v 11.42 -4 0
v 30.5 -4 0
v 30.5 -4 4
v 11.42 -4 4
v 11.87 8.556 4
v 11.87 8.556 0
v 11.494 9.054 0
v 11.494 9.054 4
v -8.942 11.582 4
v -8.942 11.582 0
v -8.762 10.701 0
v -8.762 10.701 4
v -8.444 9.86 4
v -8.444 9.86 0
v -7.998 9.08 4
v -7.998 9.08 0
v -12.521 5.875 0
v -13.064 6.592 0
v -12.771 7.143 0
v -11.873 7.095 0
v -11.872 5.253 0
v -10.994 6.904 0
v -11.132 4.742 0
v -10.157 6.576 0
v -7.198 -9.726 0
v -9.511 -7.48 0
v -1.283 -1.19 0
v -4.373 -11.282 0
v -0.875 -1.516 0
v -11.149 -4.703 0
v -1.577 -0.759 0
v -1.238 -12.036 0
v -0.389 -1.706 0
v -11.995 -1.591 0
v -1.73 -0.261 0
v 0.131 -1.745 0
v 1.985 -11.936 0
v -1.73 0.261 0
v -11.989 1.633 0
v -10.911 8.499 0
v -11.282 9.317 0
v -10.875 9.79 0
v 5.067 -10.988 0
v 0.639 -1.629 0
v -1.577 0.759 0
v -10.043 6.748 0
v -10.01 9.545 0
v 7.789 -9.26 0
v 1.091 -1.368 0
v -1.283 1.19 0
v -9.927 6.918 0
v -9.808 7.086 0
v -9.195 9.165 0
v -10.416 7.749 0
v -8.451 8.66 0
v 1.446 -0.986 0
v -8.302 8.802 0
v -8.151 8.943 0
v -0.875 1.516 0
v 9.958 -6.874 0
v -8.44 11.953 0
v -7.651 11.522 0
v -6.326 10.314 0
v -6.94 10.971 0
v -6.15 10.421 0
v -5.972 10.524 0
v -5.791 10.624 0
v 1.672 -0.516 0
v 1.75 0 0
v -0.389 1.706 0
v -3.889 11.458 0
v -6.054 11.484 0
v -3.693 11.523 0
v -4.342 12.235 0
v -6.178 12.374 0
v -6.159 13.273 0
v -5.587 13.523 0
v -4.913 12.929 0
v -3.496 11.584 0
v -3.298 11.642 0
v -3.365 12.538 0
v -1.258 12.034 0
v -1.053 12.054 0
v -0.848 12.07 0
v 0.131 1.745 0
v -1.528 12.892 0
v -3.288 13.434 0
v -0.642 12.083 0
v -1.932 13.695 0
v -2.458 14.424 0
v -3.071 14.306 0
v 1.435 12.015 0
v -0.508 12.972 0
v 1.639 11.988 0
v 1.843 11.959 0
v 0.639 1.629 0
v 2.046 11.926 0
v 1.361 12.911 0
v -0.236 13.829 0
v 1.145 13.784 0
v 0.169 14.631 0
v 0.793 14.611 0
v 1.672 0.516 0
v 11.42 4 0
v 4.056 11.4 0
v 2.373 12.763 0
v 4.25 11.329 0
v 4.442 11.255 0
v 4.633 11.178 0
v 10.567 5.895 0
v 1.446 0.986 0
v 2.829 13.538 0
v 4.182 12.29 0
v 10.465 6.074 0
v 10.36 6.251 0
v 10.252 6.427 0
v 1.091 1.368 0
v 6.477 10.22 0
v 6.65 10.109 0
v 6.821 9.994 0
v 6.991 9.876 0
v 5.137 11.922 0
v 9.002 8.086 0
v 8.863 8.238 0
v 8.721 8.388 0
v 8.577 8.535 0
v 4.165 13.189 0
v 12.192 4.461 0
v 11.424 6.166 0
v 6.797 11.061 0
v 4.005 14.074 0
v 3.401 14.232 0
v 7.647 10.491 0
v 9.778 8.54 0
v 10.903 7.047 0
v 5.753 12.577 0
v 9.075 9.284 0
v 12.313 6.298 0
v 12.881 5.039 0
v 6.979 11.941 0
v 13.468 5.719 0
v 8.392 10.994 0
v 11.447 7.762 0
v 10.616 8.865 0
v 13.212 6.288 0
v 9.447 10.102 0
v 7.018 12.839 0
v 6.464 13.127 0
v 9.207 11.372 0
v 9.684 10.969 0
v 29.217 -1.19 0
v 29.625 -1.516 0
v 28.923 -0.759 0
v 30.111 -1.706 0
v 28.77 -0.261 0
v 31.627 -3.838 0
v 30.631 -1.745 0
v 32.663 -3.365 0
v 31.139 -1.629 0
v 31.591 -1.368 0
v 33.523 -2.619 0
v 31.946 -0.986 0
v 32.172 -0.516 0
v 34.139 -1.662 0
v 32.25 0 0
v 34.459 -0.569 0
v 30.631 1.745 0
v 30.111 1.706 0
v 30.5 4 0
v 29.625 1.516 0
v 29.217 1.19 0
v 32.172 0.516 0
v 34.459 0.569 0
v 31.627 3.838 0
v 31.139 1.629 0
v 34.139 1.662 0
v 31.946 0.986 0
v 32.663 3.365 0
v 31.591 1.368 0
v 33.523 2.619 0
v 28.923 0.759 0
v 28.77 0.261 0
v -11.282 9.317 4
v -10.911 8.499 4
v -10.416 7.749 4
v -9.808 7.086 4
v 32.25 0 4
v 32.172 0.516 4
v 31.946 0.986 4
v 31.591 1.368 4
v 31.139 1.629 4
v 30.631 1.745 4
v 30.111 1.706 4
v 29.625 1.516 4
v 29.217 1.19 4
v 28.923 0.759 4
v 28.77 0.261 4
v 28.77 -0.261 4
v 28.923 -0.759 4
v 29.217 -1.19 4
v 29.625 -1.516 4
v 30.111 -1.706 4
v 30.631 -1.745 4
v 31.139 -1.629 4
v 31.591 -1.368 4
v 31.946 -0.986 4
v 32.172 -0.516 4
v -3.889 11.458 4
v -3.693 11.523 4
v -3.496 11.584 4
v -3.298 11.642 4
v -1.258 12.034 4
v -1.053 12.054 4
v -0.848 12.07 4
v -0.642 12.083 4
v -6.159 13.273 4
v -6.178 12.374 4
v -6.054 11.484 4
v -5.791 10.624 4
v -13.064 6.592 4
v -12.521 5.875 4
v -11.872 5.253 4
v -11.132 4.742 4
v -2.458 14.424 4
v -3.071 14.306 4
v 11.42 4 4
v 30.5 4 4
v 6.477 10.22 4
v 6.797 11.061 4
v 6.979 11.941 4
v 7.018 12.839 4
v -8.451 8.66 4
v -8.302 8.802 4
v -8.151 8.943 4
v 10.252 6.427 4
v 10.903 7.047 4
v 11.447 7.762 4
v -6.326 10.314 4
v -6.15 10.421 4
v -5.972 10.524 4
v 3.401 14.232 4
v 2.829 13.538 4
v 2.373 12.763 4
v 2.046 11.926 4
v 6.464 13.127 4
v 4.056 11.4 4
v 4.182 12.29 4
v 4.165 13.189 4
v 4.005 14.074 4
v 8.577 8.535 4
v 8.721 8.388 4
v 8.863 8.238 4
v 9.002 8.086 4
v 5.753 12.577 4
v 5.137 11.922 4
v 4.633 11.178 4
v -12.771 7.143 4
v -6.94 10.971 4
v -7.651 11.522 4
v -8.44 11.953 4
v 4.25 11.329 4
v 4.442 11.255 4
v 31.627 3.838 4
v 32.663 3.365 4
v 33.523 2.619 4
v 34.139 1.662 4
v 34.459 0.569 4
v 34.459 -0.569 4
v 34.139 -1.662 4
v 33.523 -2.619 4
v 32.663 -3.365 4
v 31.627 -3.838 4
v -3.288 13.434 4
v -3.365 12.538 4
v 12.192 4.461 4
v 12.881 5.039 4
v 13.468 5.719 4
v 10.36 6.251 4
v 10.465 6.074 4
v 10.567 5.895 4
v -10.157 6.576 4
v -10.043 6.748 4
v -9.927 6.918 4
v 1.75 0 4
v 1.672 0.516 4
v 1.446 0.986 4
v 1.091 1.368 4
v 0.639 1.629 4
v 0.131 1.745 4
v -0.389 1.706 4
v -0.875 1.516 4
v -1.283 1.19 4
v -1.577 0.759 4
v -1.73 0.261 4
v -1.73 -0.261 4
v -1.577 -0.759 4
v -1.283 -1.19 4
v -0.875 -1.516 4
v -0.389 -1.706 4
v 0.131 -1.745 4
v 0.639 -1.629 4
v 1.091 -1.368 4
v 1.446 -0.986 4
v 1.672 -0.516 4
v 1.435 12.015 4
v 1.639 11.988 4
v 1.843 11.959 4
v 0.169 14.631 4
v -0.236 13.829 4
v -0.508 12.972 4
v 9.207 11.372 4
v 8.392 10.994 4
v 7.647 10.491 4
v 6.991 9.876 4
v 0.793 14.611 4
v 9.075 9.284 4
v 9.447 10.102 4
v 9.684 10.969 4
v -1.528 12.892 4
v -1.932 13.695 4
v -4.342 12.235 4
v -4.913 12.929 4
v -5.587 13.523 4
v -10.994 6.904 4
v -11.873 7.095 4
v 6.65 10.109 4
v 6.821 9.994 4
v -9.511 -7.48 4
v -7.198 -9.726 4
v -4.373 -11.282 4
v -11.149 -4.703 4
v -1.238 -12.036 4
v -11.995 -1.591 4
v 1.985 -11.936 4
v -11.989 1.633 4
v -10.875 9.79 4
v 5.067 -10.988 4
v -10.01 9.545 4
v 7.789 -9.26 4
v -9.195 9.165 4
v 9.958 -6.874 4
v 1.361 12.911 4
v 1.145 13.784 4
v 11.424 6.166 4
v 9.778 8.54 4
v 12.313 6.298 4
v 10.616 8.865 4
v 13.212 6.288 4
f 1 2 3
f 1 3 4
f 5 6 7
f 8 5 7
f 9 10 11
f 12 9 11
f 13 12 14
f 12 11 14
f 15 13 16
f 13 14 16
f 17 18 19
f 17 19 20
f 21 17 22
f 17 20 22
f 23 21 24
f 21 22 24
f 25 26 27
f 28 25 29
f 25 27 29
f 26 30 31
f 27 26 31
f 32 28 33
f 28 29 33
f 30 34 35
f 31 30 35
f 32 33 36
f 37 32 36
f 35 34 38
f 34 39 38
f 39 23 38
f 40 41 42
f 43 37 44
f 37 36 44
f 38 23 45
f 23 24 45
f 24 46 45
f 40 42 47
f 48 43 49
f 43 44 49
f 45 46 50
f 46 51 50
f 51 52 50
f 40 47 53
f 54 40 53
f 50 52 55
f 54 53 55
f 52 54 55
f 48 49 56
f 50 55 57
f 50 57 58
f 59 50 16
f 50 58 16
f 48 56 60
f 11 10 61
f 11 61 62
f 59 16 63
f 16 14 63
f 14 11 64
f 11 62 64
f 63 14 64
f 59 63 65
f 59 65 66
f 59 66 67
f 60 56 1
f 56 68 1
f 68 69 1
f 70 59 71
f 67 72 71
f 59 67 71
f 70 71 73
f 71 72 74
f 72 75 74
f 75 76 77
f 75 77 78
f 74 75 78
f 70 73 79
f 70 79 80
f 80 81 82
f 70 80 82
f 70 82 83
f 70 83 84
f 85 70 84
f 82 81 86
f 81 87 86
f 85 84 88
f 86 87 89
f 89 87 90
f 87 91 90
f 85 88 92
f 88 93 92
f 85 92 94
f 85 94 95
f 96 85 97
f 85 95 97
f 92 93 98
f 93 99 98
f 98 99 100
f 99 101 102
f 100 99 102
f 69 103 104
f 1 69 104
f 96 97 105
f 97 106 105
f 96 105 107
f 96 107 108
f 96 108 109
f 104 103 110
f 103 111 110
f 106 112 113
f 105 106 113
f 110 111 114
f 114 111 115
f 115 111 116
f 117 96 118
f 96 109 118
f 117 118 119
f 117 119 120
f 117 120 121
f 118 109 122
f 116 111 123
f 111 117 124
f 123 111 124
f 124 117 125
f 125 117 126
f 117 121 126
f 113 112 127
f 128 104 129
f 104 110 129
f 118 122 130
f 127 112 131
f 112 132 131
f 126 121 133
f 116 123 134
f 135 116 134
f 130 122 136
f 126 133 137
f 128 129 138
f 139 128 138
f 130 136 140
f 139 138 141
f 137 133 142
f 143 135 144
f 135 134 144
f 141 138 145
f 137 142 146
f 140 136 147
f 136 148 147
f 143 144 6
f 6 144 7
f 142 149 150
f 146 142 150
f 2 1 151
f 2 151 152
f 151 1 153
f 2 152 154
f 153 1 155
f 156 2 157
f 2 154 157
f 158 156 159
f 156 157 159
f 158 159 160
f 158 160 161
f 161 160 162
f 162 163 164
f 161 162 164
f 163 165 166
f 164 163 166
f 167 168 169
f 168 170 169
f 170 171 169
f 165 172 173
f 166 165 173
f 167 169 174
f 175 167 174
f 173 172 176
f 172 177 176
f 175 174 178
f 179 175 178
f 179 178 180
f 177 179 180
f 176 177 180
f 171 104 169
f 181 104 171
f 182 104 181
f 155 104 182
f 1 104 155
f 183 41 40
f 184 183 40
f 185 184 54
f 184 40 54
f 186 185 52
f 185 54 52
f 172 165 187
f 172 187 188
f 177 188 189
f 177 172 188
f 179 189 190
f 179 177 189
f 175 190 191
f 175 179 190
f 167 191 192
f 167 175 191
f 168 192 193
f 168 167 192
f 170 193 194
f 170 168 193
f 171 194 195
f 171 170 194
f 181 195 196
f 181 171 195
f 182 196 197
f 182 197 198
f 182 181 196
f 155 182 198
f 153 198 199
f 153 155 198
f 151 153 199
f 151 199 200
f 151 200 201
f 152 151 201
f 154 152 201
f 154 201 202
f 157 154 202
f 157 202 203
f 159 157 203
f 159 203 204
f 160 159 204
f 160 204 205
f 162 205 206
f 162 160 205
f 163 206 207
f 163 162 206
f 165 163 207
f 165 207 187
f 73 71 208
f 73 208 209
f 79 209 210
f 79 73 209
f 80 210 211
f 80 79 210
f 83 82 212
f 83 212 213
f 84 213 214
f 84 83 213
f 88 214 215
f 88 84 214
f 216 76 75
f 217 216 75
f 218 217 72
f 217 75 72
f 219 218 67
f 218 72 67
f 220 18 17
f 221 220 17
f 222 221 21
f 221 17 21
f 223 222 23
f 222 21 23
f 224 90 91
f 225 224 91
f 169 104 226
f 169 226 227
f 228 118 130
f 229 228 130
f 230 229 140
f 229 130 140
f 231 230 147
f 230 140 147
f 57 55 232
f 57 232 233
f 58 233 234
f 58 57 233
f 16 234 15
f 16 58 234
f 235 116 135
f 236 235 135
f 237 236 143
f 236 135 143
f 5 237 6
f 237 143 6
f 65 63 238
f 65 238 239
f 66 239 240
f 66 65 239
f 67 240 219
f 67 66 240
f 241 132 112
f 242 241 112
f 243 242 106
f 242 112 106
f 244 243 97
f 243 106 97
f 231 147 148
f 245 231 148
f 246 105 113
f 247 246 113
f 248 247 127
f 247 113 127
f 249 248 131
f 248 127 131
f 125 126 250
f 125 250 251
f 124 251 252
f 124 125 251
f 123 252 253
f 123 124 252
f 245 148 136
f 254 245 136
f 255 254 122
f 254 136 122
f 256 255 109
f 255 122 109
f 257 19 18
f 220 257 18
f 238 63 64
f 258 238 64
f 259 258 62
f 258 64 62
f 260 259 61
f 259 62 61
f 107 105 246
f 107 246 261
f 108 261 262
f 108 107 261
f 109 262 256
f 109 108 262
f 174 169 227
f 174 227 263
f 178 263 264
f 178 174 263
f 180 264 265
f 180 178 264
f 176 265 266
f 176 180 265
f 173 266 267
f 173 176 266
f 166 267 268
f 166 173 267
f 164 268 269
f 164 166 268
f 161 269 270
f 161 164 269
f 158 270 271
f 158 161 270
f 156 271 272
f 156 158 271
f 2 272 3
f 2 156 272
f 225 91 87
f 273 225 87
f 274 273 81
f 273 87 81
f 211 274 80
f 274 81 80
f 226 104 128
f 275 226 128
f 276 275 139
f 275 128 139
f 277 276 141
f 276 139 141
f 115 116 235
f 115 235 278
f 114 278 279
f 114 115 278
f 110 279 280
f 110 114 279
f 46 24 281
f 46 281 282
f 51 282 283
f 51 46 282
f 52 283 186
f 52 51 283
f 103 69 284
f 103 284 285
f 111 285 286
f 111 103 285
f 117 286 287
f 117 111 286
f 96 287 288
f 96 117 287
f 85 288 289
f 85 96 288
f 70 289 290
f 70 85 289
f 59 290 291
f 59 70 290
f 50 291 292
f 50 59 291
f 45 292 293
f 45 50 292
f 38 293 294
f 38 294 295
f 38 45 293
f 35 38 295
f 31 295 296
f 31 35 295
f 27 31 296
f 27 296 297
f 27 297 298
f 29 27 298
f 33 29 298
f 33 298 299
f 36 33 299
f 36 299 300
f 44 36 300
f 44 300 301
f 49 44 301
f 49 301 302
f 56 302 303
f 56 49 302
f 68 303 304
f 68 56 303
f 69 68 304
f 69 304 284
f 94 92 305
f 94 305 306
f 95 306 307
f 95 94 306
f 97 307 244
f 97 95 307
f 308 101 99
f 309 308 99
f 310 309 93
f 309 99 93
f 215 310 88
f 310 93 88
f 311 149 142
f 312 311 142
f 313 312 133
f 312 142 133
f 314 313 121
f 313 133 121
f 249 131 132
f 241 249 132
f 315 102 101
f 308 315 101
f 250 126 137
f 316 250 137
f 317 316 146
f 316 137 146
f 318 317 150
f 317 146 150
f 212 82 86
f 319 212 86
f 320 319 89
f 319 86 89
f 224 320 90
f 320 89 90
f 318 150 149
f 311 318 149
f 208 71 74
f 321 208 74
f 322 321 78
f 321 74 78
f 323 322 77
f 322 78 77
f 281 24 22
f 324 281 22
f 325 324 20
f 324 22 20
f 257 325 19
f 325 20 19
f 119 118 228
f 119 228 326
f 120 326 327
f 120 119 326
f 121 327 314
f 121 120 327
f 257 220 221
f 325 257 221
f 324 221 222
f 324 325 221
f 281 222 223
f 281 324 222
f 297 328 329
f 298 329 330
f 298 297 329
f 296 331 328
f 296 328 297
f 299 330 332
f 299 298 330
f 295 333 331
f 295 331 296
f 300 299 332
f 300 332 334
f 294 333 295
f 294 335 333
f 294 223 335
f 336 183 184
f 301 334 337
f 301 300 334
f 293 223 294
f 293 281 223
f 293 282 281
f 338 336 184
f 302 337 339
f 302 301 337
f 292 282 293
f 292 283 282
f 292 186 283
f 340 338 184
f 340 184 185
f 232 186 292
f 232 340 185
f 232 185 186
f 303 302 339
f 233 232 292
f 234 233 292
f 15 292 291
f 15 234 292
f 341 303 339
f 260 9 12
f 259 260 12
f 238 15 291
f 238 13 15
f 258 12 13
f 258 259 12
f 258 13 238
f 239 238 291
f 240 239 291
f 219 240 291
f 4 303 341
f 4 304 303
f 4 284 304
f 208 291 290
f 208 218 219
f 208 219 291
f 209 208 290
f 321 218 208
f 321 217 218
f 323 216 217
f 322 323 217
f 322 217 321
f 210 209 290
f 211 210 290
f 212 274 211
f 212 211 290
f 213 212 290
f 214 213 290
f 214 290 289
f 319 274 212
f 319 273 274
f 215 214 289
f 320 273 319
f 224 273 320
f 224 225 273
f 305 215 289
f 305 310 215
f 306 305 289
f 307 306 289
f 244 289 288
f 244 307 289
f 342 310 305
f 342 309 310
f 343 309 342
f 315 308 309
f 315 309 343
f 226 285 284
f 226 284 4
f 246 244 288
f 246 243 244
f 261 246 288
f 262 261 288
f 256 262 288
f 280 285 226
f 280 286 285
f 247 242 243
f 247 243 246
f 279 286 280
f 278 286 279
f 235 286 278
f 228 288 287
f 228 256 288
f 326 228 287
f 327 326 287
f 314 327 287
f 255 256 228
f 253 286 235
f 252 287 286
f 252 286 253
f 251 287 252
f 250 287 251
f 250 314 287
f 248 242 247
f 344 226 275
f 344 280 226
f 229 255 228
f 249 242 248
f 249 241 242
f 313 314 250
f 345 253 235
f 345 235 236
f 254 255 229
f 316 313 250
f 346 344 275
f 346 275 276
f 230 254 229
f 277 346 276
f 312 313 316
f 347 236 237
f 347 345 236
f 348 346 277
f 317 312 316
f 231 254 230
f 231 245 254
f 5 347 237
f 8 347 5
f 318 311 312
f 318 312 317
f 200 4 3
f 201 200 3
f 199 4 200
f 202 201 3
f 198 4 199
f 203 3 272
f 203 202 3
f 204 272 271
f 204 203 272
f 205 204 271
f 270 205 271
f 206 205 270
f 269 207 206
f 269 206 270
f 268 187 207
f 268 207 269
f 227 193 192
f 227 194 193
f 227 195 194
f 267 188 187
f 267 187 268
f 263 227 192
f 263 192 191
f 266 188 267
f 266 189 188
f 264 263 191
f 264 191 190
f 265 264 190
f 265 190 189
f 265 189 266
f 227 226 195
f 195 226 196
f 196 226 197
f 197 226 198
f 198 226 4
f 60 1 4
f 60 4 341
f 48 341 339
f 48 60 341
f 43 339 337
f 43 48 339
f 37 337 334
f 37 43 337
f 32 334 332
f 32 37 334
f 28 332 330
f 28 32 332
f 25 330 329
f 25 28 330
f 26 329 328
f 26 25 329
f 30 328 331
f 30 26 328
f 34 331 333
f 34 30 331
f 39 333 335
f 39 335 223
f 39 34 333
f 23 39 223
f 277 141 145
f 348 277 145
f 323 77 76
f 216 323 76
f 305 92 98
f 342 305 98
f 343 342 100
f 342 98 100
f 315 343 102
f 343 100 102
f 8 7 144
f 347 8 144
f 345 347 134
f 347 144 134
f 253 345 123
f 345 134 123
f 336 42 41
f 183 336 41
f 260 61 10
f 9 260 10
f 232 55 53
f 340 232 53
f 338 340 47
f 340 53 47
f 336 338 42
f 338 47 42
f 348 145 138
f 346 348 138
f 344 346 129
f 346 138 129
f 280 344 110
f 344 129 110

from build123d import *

# Parameters (mm, degrees)
SKETCH1_R           = 1.75
BOSS_EXTRUDE2_DEPTH = 4


with BuildPart() as part:
    # Sketch1 → Boss-Extrude2 (new body)
    # profile 1 of 12: a face of its own
    with BuildSketch(Plane.XY):
        with BuildLine():
            Line((30.5, -4), (11.419719786, -4))
            ThreePointArc((11.419719786, -4), (-12.1, 0), (11.419719786, 4))
            Line((11.419719786, 4), (30.5, 4))
            ThreePointArc((30.5, 4), (34.5, 0), (30.5, -4))
        make_face()
        Circle(SKETCH1_R, mode=Mode.SUBTRACT)
        with Locations((30.5, 0)):
            Circle(SKETCH1_R, mode=Mode.SUBTRACT)
    # profile 2 of 12: a face of its own
    with BuildSketch(Plane.XY):
        with BuildLine():
            ThreePointArc((2.04630572, 11.925713098), (3.062574606, 11.706008576), (4.056229837, 11.399868399))
            ThreePointArc((4.056229837, 11.399868399), (4.191789848, 12.739862338), (4.004557713, 14.073618088))
            Line((4.004557713, 14.073618088), (3.400741544, 14.231598069))
            ThreePointArc((3.400741544, 14.231598069), (2.585583316, 13.159679272), (2.04630572, 11.925713098))
        make_face()
    # profile 3 of 12: a face of its own
    with BuildSketch(Plane.XY):
        with BuildLine():
            ThreePointArc((-0.641917286, 12.082960821), (0.397776079, 12.093459976), (1.434532317, 12.014662585))
            ThreePointArc((1.434532317, 12.014662585), (1.27037575, 13.351454601), (0.792800193, 14.610772615))
            Line((0.792800193, 14.610772615), (0.168997044, 14.631297504))
            ThreePointArc((0.168997044, 14.631297504), (-0.388904138, 13.405638858), (-0.641917286, 12.082960821))
        make_face()
    # profile 4 of 12: a face of its own
    with BuildSketch(Plane.XY):
        with BuildLine():
            ThreePointArc((-3.071117398, 14.306350498), (-3.344130279, 12.987655382), (-3.298347959, 11.641773952))
            ThreePointArc((-3.298347959, 11.641773952), (-2.286723162, 11.881956791), (-1.258213497, 12.034404796))
            ThreePointArc((-1.258213497, 12.034404796), (-1.713956435, 13.301787393), (-2.458222459, 14.424297241))
            Line((-2.458222459, 14.424297241), (-3.071117398, 14.306350498))
        make_face()
    # profile 5 of 12: a face of its own
    with BuildSketch(Plane.XY):
        with BuildLine():
            ThreePointArc((-6.159128153, 13.272850751), (-6.133731183, 11.926430371), (-5.791420864, 10.624003218))
            ThreePointArc((-5.791420864, 10.624003218), (-4.857967527, 11.08197417), (-3.888643585, 11.458117257))
            ThreePointArc((-3.888643585, 11.458117257), (-4.613401246, 12.593320589), (-5.587496363, 13.523427559))
            Line((-5.587496363, 13.523427559), (-6.159128153, 13.272850751))
        make_face()
    # profile 6 of 12: a face of its own
    with BuildSketch(Plane.XY):
        with BuildLine():
            ThreePointArc((-8.942094855, 11.581984556), (-8.619545875, 10.274523276), (-7.997661209, 9.080055902))
            ThreePointArc((-7.997661209, 9.080055902), (-7.188610613, 9.733132972), (-6.326480245, 10.314341845))
            ThreePointArc((-6.326480245, 10.314341845), (-7.28435745, 11.261142529), (-8.440037507, 11.952781076))
            Line((-8.440037507, 11.952781076), (-8.942094855, 11.581984556))
        make_face()
    # profile 7 of 12: a face of its own
    with BuildSketch(Plane.XY):
        with BuildLine():
            ThreePointArc((-11.2821851, 9.317495695), (-10.67845904, 8.113748343), (-9.807800202, 7.086399311))
            ThreePointArc((-9.807800202, 7.086399311), (-9.163222316, 7.902237454), (-8.450984381, 8.659726496))
            ThreePointArc((-8.450984381, 8.659726496), (-9.594540202, 9.371232193), (-10.874567661, 9.790147432))
            Line((-10.874567661, 9.790147432), (-11.2821851, 9.317495695))
        make_face()
    # profile 8 of 12: a face of its own
    with BuildSketch(Plane.XY):
        with BuildLine():
            ThreePointArc((-13.06350089, 6.591537844), (-12.208498581, 5.551122593), (-11.13218682, 4.741773571))
            ThreePointArc((-11.13218682, 4.741773571), (-10.684005749, 5.67996665), (-10.15693536, 6.576219589))
            ThreePointArc((-10.15693536, 6.576219589), (-11.42953274, 7.017191451), (-12.770511491, 7.142635705))
            Line((-12.770511491, 7.142635705), (-13.06350089, 6.591537844))
        make_face()
    # profile 9 of 12: a face of its own
    with BuildSketch(Plane.XY):
        with BuildLine():
            ThreePointArc((4.633181039, 11.177818815), (5.575692546, 10.738791954), (6.47703386, 10.22047124))
            ThreePointArc((6.47703386, 10.22047124), (6.905596548, 11.497301024), (7.017980909, 12.839437391))
            Line((7.017980909, 12.839437391), (6.464057014, 13.127048167))
            ThreePointArc((6.464057014, 13.127048167), (5.432014202, 12.2619583), (4.633181039, 11.177818815))
        make_face()
    # profile 10 of 12: a face of its own
    with BuildSketch(Plane.XY):
        with BuildLine():
            ThreePointArc((6.990588114, 9.876319042), (7.812662335, 9.239713591), (8.577048867, 8.534883288))
            ThreePointArc((8.577048867, 8.534883288), (9.277388744, 9.685311177), (9.683823524, 10.969355975))
            Line((9.683823524, 10.969355975), (9.207226173, 11.372353004))
            ThreePointArc((9.207226173, 11.372353004), (8.009412915, 10.7569375), (6.990588114, 9.876319042))
        make_face()
    # profile 11 of 12: a face of its own
    with BuildSketch(Plane.XY):
        with BuildLine():
            ThreePointArc((9.001771295, 8.085673352), (9.662693238, 7.283018563), (10.252267103, 6.426586905))
            ThreePointArc((10.252267103, 6.426586905), (11.189698333, 7.393635488), (11.870053976, 8.555993639))
            Line((11.870053976, 8.555993639), (11.494387677, 9.054417628))
            ThreePointArc((11.494387677, 9.054417628), (10.190128247, 8.719156263), (9.001771295, 8.085673352))
        make_face()
    # profile 12 of 12: a face of its own
    with BuildSketch(Plane.XY):
        with BuildLine():
            ThreePointArc((10.567122415, 5.894567319), (11.034158501, 4.965616394), (11.419719786, 4))
            ThreePointArc((11.419719786, 4), (12.547814073, 4.735774119), (13.468394505, 5.718877338))
            Line((13.468394505, 5.718877338), (13.212264939, 6.288042768))
            ThreePointArc((13.212264939, 6.288042768), (11.866155587, 6.249540081), (10.567122415, 5.894567319))
        make_face()
    extrude(amount=BOSS_EXTRUDE2_DEPTH)


solid = part.part
